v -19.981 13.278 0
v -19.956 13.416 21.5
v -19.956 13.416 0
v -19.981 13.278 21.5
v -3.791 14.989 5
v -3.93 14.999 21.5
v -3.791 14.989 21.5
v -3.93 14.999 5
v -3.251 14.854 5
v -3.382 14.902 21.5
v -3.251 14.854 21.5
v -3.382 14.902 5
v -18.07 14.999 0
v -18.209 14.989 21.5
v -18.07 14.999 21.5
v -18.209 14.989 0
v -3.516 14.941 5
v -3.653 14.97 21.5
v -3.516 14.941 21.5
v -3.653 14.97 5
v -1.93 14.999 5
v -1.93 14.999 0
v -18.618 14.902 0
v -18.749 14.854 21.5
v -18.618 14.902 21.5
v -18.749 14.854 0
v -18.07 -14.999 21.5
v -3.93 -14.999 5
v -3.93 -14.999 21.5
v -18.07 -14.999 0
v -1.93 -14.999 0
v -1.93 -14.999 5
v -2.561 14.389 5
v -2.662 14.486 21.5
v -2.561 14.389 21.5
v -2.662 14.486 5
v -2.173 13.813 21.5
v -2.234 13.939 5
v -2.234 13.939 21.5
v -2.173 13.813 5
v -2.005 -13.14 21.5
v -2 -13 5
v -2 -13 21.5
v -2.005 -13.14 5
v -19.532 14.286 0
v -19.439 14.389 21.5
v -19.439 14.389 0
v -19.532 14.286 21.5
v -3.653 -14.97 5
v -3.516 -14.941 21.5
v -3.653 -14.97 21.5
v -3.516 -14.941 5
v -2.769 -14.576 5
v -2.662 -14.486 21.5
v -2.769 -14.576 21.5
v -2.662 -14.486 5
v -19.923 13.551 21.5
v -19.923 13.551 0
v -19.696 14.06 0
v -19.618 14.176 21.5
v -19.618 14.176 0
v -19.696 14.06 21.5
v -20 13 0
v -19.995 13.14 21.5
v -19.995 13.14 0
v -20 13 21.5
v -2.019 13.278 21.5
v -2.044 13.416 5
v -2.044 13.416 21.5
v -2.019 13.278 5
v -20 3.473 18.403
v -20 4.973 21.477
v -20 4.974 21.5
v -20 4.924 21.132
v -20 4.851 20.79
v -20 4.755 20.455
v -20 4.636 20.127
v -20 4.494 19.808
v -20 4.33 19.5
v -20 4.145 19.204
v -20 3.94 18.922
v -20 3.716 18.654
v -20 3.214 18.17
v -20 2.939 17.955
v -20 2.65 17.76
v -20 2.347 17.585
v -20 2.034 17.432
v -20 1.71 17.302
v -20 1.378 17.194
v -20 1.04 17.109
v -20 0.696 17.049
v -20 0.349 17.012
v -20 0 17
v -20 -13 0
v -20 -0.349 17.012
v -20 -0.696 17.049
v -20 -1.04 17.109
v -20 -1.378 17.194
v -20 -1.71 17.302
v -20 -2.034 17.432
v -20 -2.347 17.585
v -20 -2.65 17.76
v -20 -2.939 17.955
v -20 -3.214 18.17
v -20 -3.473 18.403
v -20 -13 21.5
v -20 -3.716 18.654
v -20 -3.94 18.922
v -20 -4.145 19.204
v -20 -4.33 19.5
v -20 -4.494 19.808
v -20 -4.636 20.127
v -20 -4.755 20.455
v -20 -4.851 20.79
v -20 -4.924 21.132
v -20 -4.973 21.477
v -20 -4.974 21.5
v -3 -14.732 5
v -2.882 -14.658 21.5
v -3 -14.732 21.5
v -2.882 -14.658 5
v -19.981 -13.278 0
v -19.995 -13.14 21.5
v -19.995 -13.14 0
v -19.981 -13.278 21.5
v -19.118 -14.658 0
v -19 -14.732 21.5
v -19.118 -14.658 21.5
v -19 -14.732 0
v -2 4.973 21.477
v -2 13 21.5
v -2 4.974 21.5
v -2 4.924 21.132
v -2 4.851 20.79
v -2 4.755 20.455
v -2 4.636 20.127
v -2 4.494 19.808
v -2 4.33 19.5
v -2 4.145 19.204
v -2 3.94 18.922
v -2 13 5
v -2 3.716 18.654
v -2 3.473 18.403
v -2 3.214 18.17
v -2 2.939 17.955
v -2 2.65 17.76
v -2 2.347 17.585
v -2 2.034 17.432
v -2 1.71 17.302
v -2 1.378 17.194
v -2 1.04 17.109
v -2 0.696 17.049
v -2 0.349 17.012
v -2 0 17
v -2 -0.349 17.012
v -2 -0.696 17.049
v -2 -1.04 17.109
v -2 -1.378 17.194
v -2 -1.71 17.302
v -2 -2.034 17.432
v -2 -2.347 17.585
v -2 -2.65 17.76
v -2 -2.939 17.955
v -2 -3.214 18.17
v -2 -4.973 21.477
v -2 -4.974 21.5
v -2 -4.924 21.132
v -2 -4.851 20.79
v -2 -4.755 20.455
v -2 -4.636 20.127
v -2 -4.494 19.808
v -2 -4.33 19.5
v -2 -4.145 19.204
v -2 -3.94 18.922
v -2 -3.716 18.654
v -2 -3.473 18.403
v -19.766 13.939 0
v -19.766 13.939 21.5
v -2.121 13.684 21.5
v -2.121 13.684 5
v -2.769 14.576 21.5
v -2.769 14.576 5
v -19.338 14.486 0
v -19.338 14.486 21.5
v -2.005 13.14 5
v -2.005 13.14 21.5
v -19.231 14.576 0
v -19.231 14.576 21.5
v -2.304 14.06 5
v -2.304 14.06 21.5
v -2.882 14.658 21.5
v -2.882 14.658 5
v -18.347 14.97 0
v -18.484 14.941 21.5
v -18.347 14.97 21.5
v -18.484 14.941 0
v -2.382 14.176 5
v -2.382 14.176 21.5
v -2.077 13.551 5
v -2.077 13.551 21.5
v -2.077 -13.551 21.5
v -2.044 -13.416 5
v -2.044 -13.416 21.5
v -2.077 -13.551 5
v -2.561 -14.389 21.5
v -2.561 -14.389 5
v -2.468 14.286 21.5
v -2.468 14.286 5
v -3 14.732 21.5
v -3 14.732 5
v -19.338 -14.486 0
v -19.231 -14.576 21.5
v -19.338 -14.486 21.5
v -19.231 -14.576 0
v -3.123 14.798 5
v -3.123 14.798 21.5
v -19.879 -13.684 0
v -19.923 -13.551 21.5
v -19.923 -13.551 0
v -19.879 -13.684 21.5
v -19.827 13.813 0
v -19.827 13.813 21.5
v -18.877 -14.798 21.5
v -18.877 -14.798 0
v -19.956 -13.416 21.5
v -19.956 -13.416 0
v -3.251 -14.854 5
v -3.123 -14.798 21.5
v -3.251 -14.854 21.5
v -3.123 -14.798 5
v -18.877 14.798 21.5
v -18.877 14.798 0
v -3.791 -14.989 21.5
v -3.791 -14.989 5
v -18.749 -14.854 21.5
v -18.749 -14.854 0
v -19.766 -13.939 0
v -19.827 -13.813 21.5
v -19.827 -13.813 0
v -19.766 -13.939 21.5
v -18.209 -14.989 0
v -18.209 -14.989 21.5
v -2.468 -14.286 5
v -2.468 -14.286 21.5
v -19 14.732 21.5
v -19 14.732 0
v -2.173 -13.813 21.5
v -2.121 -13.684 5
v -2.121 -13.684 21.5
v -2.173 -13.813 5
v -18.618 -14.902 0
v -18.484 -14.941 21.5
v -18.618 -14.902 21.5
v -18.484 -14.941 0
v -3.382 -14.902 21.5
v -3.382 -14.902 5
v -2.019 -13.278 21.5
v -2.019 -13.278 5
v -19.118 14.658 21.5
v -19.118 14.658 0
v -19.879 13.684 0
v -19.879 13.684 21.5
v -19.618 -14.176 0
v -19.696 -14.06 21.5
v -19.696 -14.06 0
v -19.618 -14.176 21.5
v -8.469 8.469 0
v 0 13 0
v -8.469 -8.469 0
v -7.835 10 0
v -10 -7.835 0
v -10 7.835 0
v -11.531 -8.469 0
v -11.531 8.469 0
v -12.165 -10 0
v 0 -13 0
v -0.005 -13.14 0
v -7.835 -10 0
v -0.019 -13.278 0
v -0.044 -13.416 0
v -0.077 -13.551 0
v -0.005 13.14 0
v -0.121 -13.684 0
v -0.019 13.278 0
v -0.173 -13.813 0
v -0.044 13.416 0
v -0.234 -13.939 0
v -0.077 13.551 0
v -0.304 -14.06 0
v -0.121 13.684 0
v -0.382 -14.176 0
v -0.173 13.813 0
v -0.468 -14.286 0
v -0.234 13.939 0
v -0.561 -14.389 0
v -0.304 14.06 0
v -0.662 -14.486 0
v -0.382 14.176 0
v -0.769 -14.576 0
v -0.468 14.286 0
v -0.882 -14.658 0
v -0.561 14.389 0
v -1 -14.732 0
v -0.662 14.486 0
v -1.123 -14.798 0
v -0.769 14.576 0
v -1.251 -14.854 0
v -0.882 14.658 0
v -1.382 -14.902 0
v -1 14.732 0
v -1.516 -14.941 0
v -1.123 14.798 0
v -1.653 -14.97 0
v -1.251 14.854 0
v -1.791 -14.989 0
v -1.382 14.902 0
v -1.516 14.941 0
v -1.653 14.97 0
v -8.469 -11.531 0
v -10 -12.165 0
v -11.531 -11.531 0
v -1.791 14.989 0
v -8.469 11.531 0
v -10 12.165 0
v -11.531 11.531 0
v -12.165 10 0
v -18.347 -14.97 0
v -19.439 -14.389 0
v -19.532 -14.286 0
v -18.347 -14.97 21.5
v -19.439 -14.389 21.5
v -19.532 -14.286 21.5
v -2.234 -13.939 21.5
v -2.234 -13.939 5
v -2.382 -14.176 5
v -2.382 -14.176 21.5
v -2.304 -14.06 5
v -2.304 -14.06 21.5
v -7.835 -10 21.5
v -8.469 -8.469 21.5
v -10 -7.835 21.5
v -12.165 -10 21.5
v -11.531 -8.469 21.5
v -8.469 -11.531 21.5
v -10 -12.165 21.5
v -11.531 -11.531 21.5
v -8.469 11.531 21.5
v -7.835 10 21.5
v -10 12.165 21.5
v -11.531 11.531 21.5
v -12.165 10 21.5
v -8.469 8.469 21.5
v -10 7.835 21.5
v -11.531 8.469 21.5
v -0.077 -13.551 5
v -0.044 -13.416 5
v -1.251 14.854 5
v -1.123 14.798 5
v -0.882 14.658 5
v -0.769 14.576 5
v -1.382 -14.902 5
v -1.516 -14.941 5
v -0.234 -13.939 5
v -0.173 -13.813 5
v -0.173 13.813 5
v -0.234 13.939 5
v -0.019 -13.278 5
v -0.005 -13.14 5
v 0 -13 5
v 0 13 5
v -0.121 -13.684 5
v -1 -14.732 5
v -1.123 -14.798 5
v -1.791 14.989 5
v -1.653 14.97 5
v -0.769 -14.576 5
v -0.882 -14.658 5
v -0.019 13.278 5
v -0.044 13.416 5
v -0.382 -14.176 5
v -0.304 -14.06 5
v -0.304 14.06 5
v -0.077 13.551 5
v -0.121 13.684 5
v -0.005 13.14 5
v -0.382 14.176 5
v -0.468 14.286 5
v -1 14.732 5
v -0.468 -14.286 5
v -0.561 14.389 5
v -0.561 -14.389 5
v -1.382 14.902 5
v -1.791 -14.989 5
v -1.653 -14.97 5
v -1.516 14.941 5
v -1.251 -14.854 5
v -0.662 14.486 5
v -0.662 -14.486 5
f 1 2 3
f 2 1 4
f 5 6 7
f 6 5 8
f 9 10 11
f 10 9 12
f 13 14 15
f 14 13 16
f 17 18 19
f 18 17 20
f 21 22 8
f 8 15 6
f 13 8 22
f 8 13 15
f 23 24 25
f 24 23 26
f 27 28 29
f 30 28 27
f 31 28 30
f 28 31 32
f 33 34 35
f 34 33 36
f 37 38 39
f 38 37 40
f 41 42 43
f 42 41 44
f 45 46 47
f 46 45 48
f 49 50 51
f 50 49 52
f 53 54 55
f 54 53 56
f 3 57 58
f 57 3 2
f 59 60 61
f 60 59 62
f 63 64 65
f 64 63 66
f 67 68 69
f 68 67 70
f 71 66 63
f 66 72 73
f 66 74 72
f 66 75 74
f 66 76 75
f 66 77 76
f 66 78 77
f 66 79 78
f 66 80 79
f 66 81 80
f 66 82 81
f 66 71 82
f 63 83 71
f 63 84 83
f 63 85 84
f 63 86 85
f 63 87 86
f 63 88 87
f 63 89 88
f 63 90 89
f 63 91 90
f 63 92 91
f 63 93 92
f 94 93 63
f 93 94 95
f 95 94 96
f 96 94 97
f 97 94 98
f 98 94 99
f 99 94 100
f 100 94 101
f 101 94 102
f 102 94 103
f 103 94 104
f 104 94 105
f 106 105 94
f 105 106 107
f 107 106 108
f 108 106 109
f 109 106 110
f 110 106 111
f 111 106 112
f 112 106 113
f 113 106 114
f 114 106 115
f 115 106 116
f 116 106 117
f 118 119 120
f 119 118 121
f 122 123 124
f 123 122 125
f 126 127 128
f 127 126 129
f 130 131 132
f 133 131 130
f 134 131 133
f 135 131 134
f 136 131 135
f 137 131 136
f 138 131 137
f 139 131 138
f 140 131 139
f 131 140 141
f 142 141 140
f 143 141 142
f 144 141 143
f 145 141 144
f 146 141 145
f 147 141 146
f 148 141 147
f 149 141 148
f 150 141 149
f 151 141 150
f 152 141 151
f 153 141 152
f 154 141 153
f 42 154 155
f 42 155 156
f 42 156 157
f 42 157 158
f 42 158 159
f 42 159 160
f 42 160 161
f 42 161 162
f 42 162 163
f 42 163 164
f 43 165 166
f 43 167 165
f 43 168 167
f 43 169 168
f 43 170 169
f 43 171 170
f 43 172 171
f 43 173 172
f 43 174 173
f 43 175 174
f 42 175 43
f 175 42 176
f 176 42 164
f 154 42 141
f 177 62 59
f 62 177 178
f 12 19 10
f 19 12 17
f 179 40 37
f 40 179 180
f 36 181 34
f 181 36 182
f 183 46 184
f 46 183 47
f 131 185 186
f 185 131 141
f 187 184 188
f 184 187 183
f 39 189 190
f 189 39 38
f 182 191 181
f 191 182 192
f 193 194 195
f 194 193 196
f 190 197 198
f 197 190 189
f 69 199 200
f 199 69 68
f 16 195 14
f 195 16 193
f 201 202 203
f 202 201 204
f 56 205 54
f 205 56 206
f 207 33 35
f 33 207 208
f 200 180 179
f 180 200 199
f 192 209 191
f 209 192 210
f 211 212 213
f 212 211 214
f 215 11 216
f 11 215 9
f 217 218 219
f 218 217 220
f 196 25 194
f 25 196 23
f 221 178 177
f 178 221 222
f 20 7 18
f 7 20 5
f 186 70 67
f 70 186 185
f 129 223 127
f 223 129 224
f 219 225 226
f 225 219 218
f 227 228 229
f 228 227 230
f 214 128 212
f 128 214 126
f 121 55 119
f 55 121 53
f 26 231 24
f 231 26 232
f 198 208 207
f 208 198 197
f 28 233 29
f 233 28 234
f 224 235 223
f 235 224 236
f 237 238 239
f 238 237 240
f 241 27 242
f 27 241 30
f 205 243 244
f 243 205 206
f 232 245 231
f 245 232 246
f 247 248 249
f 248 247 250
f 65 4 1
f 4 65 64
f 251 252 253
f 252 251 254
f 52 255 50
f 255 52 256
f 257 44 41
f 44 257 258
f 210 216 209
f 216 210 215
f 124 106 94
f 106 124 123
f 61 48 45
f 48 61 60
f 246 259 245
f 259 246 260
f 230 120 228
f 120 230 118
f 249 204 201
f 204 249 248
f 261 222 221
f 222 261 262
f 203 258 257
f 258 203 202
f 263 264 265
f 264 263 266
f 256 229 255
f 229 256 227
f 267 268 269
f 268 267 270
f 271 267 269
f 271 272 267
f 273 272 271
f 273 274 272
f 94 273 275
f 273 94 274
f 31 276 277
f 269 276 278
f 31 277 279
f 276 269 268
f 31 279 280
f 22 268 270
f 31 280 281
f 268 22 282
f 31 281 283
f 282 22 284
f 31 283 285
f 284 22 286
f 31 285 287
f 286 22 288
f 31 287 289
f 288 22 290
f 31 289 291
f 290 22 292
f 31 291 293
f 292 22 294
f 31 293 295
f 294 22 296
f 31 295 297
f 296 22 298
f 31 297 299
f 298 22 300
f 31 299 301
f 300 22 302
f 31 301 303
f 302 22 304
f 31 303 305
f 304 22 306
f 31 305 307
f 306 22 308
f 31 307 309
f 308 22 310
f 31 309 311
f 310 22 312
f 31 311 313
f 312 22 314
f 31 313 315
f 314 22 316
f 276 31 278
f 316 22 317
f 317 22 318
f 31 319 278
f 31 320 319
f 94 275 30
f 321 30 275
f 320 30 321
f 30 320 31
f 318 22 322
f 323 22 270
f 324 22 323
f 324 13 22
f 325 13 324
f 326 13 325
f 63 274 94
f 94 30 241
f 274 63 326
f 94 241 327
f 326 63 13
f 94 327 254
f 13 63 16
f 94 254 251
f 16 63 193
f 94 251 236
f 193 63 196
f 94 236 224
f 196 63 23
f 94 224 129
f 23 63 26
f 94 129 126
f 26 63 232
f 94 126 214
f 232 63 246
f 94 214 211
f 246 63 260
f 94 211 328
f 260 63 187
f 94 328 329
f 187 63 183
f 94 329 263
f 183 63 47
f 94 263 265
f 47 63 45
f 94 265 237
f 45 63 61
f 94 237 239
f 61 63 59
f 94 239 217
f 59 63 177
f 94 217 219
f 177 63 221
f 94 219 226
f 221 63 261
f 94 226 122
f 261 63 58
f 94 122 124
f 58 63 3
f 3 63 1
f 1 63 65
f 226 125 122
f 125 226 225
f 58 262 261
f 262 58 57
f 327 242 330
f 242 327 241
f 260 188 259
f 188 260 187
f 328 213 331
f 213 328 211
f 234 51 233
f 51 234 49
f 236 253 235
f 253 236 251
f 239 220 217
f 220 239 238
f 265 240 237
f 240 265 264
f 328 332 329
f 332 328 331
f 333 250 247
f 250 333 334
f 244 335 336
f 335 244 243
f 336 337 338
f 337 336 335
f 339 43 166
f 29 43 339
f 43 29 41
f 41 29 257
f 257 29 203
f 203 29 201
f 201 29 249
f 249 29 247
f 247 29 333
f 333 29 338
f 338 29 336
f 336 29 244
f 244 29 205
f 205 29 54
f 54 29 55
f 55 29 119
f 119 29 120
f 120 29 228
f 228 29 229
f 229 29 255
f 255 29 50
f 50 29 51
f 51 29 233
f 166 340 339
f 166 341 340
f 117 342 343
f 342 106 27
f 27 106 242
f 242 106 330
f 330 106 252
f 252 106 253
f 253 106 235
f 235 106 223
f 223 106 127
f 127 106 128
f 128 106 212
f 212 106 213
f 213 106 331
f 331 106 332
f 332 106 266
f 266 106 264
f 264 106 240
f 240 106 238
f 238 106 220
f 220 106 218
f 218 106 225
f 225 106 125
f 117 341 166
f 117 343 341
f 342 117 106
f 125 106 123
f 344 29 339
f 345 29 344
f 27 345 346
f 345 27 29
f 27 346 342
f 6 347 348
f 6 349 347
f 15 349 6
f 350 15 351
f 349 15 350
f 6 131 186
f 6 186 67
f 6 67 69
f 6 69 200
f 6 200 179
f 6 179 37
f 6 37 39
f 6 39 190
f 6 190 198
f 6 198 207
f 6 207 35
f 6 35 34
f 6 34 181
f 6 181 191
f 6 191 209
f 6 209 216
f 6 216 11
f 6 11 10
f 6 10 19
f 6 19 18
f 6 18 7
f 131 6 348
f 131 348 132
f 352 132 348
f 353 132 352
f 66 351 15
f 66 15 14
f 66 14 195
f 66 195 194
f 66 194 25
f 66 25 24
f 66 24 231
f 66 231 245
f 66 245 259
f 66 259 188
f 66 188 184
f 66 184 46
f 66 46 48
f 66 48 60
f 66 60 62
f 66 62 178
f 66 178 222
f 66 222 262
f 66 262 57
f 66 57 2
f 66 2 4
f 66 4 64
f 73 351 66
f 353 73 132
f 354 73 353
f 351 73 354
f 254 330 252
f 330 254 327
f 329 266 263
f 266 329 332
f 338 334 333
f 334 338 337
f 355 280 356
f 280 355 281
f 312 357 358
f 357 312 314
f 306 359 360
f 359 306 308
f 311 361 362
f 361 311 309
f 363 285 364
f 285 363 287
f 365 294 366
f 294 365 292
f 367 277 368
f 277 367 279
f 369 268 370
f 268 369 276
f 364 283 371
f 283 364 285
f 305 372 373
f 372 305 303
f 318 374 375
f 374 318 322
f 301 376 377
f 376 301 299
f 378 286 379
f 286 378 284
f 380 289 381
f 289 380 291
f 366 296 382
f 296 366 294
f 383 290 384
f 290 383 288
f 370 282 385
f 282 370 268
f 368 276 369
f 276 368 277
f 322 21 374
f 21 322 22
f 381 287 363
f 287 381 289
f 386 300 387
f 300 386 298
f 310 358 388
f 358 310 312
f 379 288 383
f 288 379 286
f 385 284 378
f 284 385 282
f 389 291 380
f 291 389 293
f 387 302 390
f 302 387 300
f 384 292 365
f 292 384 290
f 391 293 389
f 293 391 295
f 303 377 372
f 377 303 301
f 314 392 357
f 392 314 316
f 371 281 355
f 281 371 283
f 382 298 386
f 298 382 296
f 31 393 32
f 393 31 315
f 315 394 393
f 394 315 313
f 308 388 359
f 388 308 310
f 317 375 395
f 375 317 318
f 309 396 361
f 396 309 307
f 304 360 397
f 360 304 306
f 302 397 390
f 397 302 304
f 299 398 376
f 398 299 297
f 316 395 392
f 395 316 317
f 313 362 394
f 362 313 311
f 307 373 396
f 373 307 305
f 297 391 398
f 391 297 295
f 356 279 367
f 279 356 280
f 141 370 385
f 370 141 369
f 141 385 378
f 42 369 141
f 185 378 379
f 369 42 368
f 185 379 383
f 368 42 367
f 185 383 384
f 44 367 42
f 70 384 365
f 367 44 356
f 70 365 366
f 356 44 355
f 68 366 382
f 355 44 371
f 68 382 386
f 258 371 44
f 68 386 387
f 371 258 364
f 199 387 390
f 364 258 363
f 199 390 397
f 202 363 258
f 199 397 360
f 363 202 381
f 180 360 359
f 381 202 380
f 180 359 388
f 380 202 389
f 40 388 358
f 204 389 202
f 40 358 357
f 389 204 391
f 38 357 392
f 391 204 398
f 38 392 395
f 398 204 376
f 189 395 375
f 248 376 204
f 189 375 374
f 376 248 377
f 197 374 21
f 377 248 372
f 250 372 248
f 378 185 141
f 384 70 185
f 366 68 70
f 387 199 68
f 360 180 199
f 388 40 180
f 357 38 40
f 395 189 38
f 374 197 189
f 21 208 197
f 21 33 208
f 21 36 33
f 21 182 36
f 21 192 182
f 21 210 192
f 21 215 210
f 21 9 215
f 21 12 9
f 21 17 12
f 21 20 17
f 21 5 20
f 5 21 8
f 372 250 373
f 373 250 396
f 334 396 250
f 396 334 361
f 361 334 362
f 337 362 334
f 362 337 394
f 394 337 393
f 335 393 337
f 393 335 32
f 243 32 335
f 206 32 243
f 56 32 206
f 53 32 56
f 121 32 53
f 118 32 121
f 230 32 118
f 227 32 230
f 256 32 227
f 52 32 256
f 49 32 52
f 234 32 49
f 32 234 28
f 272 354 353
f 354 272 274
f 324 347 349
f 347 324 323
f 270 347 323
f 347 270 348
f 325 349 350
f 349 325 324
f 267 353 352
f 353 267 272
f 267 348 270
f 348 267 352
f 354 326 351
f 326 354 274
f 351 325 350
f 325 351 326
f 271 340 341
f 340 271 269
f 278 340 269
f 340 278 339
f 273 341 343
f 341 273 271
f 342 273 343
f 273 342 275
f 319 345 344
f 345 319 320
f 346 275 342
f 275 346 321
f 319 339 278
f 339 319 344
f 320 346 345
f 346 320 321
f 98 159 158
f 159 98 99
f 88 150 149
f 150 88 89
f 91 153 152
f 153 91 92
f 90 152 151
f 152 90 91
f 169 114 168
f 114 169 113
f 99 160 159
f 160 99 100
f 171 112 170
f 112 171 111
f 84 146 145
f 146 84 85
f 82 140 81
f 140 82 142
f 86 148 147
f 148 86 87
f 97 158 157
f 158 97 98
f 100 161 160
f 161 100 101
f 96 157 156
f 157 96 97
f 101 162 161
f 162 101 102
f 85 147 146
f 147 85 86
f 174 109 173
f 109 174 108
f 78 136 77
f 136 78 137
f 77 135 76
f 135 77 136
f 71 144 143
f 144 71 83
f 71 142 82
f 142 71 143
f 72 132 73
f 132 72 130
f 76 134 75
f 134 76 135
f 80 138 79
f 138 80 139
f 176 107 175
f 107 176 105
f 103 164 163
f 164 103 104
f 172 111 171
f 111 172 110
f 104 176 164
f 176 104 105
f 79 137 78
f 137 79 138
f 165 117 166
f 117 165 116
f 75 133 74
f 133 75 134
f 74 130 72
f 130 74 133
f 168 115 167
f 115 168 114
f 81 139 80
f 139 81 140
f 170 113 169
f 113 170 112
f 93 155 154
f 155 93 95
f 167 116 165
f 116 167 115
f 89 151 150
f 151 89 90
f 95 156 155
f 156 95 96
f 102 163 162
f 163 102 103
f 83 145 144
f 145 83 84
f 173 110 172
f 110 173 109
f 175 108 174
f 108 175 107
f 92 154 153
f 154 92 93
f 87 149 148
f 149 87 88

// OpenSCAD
// file: polyhole.scad
// The Cylinder is dead! Long live the Cylinder!
// A module for a polyhole by radius, based on Nophead's work.

module polyhole(h, r, cent = false)
{
    n = max(round(4 * r), 3);
    cylinder(h = h, r = r / cos(180 / n), $fn = n, center = cent);
}
// main file
// Mount for z rods
// Uses 40mm m4 bolts

use<polyhole.scad>

ZBarMount();

module ZBarMount()
{
    difference()
    {
        union()
        {
            hull()
            {
                translate([-18, -13, 0])
                    cylinder(h = 15+4.5+2, r = 2, $fn = 90);
                translate([-4, -13, 0])
                    cylinder(h = 15+4.5+2, r = 2, $fn = 90);
                translate([-18, 13, 0])
                    cylinder(h = 15+4.5+2, r = 2, $fn = 90);
                translate([-4, 13, 0])
                    cylinder(h = 15+4.5+2, r = 2, $fn = 90);
            }
            hull()
            {
                translate([-18, -13, 0])
                    cylinder(h = 5, r = 2, $fn = 90);
                translate([-2, -13, 0])
                    cylinder(h = 5, r = 2, $fn = 90);
                translate([-18, 13, 0])
                    cylinder(h = 5, r = 2, $fn = 90);
                translate([-2, 13, 0])
                    cylinder(h = 5, r = 2, $fn = 90);
            }
        }
        translate([-10, 10, 0])
            polyhole(15+4.5+2, 2);
        translate([-10, -10, 0])
            polyhole(15+4.5+2, 2);
        translate([-2, 0, 15+5+2])
            rotate([0, -90, 0])
                cylinder(h = 20, r = 5, $fn = 90);
    }
}
